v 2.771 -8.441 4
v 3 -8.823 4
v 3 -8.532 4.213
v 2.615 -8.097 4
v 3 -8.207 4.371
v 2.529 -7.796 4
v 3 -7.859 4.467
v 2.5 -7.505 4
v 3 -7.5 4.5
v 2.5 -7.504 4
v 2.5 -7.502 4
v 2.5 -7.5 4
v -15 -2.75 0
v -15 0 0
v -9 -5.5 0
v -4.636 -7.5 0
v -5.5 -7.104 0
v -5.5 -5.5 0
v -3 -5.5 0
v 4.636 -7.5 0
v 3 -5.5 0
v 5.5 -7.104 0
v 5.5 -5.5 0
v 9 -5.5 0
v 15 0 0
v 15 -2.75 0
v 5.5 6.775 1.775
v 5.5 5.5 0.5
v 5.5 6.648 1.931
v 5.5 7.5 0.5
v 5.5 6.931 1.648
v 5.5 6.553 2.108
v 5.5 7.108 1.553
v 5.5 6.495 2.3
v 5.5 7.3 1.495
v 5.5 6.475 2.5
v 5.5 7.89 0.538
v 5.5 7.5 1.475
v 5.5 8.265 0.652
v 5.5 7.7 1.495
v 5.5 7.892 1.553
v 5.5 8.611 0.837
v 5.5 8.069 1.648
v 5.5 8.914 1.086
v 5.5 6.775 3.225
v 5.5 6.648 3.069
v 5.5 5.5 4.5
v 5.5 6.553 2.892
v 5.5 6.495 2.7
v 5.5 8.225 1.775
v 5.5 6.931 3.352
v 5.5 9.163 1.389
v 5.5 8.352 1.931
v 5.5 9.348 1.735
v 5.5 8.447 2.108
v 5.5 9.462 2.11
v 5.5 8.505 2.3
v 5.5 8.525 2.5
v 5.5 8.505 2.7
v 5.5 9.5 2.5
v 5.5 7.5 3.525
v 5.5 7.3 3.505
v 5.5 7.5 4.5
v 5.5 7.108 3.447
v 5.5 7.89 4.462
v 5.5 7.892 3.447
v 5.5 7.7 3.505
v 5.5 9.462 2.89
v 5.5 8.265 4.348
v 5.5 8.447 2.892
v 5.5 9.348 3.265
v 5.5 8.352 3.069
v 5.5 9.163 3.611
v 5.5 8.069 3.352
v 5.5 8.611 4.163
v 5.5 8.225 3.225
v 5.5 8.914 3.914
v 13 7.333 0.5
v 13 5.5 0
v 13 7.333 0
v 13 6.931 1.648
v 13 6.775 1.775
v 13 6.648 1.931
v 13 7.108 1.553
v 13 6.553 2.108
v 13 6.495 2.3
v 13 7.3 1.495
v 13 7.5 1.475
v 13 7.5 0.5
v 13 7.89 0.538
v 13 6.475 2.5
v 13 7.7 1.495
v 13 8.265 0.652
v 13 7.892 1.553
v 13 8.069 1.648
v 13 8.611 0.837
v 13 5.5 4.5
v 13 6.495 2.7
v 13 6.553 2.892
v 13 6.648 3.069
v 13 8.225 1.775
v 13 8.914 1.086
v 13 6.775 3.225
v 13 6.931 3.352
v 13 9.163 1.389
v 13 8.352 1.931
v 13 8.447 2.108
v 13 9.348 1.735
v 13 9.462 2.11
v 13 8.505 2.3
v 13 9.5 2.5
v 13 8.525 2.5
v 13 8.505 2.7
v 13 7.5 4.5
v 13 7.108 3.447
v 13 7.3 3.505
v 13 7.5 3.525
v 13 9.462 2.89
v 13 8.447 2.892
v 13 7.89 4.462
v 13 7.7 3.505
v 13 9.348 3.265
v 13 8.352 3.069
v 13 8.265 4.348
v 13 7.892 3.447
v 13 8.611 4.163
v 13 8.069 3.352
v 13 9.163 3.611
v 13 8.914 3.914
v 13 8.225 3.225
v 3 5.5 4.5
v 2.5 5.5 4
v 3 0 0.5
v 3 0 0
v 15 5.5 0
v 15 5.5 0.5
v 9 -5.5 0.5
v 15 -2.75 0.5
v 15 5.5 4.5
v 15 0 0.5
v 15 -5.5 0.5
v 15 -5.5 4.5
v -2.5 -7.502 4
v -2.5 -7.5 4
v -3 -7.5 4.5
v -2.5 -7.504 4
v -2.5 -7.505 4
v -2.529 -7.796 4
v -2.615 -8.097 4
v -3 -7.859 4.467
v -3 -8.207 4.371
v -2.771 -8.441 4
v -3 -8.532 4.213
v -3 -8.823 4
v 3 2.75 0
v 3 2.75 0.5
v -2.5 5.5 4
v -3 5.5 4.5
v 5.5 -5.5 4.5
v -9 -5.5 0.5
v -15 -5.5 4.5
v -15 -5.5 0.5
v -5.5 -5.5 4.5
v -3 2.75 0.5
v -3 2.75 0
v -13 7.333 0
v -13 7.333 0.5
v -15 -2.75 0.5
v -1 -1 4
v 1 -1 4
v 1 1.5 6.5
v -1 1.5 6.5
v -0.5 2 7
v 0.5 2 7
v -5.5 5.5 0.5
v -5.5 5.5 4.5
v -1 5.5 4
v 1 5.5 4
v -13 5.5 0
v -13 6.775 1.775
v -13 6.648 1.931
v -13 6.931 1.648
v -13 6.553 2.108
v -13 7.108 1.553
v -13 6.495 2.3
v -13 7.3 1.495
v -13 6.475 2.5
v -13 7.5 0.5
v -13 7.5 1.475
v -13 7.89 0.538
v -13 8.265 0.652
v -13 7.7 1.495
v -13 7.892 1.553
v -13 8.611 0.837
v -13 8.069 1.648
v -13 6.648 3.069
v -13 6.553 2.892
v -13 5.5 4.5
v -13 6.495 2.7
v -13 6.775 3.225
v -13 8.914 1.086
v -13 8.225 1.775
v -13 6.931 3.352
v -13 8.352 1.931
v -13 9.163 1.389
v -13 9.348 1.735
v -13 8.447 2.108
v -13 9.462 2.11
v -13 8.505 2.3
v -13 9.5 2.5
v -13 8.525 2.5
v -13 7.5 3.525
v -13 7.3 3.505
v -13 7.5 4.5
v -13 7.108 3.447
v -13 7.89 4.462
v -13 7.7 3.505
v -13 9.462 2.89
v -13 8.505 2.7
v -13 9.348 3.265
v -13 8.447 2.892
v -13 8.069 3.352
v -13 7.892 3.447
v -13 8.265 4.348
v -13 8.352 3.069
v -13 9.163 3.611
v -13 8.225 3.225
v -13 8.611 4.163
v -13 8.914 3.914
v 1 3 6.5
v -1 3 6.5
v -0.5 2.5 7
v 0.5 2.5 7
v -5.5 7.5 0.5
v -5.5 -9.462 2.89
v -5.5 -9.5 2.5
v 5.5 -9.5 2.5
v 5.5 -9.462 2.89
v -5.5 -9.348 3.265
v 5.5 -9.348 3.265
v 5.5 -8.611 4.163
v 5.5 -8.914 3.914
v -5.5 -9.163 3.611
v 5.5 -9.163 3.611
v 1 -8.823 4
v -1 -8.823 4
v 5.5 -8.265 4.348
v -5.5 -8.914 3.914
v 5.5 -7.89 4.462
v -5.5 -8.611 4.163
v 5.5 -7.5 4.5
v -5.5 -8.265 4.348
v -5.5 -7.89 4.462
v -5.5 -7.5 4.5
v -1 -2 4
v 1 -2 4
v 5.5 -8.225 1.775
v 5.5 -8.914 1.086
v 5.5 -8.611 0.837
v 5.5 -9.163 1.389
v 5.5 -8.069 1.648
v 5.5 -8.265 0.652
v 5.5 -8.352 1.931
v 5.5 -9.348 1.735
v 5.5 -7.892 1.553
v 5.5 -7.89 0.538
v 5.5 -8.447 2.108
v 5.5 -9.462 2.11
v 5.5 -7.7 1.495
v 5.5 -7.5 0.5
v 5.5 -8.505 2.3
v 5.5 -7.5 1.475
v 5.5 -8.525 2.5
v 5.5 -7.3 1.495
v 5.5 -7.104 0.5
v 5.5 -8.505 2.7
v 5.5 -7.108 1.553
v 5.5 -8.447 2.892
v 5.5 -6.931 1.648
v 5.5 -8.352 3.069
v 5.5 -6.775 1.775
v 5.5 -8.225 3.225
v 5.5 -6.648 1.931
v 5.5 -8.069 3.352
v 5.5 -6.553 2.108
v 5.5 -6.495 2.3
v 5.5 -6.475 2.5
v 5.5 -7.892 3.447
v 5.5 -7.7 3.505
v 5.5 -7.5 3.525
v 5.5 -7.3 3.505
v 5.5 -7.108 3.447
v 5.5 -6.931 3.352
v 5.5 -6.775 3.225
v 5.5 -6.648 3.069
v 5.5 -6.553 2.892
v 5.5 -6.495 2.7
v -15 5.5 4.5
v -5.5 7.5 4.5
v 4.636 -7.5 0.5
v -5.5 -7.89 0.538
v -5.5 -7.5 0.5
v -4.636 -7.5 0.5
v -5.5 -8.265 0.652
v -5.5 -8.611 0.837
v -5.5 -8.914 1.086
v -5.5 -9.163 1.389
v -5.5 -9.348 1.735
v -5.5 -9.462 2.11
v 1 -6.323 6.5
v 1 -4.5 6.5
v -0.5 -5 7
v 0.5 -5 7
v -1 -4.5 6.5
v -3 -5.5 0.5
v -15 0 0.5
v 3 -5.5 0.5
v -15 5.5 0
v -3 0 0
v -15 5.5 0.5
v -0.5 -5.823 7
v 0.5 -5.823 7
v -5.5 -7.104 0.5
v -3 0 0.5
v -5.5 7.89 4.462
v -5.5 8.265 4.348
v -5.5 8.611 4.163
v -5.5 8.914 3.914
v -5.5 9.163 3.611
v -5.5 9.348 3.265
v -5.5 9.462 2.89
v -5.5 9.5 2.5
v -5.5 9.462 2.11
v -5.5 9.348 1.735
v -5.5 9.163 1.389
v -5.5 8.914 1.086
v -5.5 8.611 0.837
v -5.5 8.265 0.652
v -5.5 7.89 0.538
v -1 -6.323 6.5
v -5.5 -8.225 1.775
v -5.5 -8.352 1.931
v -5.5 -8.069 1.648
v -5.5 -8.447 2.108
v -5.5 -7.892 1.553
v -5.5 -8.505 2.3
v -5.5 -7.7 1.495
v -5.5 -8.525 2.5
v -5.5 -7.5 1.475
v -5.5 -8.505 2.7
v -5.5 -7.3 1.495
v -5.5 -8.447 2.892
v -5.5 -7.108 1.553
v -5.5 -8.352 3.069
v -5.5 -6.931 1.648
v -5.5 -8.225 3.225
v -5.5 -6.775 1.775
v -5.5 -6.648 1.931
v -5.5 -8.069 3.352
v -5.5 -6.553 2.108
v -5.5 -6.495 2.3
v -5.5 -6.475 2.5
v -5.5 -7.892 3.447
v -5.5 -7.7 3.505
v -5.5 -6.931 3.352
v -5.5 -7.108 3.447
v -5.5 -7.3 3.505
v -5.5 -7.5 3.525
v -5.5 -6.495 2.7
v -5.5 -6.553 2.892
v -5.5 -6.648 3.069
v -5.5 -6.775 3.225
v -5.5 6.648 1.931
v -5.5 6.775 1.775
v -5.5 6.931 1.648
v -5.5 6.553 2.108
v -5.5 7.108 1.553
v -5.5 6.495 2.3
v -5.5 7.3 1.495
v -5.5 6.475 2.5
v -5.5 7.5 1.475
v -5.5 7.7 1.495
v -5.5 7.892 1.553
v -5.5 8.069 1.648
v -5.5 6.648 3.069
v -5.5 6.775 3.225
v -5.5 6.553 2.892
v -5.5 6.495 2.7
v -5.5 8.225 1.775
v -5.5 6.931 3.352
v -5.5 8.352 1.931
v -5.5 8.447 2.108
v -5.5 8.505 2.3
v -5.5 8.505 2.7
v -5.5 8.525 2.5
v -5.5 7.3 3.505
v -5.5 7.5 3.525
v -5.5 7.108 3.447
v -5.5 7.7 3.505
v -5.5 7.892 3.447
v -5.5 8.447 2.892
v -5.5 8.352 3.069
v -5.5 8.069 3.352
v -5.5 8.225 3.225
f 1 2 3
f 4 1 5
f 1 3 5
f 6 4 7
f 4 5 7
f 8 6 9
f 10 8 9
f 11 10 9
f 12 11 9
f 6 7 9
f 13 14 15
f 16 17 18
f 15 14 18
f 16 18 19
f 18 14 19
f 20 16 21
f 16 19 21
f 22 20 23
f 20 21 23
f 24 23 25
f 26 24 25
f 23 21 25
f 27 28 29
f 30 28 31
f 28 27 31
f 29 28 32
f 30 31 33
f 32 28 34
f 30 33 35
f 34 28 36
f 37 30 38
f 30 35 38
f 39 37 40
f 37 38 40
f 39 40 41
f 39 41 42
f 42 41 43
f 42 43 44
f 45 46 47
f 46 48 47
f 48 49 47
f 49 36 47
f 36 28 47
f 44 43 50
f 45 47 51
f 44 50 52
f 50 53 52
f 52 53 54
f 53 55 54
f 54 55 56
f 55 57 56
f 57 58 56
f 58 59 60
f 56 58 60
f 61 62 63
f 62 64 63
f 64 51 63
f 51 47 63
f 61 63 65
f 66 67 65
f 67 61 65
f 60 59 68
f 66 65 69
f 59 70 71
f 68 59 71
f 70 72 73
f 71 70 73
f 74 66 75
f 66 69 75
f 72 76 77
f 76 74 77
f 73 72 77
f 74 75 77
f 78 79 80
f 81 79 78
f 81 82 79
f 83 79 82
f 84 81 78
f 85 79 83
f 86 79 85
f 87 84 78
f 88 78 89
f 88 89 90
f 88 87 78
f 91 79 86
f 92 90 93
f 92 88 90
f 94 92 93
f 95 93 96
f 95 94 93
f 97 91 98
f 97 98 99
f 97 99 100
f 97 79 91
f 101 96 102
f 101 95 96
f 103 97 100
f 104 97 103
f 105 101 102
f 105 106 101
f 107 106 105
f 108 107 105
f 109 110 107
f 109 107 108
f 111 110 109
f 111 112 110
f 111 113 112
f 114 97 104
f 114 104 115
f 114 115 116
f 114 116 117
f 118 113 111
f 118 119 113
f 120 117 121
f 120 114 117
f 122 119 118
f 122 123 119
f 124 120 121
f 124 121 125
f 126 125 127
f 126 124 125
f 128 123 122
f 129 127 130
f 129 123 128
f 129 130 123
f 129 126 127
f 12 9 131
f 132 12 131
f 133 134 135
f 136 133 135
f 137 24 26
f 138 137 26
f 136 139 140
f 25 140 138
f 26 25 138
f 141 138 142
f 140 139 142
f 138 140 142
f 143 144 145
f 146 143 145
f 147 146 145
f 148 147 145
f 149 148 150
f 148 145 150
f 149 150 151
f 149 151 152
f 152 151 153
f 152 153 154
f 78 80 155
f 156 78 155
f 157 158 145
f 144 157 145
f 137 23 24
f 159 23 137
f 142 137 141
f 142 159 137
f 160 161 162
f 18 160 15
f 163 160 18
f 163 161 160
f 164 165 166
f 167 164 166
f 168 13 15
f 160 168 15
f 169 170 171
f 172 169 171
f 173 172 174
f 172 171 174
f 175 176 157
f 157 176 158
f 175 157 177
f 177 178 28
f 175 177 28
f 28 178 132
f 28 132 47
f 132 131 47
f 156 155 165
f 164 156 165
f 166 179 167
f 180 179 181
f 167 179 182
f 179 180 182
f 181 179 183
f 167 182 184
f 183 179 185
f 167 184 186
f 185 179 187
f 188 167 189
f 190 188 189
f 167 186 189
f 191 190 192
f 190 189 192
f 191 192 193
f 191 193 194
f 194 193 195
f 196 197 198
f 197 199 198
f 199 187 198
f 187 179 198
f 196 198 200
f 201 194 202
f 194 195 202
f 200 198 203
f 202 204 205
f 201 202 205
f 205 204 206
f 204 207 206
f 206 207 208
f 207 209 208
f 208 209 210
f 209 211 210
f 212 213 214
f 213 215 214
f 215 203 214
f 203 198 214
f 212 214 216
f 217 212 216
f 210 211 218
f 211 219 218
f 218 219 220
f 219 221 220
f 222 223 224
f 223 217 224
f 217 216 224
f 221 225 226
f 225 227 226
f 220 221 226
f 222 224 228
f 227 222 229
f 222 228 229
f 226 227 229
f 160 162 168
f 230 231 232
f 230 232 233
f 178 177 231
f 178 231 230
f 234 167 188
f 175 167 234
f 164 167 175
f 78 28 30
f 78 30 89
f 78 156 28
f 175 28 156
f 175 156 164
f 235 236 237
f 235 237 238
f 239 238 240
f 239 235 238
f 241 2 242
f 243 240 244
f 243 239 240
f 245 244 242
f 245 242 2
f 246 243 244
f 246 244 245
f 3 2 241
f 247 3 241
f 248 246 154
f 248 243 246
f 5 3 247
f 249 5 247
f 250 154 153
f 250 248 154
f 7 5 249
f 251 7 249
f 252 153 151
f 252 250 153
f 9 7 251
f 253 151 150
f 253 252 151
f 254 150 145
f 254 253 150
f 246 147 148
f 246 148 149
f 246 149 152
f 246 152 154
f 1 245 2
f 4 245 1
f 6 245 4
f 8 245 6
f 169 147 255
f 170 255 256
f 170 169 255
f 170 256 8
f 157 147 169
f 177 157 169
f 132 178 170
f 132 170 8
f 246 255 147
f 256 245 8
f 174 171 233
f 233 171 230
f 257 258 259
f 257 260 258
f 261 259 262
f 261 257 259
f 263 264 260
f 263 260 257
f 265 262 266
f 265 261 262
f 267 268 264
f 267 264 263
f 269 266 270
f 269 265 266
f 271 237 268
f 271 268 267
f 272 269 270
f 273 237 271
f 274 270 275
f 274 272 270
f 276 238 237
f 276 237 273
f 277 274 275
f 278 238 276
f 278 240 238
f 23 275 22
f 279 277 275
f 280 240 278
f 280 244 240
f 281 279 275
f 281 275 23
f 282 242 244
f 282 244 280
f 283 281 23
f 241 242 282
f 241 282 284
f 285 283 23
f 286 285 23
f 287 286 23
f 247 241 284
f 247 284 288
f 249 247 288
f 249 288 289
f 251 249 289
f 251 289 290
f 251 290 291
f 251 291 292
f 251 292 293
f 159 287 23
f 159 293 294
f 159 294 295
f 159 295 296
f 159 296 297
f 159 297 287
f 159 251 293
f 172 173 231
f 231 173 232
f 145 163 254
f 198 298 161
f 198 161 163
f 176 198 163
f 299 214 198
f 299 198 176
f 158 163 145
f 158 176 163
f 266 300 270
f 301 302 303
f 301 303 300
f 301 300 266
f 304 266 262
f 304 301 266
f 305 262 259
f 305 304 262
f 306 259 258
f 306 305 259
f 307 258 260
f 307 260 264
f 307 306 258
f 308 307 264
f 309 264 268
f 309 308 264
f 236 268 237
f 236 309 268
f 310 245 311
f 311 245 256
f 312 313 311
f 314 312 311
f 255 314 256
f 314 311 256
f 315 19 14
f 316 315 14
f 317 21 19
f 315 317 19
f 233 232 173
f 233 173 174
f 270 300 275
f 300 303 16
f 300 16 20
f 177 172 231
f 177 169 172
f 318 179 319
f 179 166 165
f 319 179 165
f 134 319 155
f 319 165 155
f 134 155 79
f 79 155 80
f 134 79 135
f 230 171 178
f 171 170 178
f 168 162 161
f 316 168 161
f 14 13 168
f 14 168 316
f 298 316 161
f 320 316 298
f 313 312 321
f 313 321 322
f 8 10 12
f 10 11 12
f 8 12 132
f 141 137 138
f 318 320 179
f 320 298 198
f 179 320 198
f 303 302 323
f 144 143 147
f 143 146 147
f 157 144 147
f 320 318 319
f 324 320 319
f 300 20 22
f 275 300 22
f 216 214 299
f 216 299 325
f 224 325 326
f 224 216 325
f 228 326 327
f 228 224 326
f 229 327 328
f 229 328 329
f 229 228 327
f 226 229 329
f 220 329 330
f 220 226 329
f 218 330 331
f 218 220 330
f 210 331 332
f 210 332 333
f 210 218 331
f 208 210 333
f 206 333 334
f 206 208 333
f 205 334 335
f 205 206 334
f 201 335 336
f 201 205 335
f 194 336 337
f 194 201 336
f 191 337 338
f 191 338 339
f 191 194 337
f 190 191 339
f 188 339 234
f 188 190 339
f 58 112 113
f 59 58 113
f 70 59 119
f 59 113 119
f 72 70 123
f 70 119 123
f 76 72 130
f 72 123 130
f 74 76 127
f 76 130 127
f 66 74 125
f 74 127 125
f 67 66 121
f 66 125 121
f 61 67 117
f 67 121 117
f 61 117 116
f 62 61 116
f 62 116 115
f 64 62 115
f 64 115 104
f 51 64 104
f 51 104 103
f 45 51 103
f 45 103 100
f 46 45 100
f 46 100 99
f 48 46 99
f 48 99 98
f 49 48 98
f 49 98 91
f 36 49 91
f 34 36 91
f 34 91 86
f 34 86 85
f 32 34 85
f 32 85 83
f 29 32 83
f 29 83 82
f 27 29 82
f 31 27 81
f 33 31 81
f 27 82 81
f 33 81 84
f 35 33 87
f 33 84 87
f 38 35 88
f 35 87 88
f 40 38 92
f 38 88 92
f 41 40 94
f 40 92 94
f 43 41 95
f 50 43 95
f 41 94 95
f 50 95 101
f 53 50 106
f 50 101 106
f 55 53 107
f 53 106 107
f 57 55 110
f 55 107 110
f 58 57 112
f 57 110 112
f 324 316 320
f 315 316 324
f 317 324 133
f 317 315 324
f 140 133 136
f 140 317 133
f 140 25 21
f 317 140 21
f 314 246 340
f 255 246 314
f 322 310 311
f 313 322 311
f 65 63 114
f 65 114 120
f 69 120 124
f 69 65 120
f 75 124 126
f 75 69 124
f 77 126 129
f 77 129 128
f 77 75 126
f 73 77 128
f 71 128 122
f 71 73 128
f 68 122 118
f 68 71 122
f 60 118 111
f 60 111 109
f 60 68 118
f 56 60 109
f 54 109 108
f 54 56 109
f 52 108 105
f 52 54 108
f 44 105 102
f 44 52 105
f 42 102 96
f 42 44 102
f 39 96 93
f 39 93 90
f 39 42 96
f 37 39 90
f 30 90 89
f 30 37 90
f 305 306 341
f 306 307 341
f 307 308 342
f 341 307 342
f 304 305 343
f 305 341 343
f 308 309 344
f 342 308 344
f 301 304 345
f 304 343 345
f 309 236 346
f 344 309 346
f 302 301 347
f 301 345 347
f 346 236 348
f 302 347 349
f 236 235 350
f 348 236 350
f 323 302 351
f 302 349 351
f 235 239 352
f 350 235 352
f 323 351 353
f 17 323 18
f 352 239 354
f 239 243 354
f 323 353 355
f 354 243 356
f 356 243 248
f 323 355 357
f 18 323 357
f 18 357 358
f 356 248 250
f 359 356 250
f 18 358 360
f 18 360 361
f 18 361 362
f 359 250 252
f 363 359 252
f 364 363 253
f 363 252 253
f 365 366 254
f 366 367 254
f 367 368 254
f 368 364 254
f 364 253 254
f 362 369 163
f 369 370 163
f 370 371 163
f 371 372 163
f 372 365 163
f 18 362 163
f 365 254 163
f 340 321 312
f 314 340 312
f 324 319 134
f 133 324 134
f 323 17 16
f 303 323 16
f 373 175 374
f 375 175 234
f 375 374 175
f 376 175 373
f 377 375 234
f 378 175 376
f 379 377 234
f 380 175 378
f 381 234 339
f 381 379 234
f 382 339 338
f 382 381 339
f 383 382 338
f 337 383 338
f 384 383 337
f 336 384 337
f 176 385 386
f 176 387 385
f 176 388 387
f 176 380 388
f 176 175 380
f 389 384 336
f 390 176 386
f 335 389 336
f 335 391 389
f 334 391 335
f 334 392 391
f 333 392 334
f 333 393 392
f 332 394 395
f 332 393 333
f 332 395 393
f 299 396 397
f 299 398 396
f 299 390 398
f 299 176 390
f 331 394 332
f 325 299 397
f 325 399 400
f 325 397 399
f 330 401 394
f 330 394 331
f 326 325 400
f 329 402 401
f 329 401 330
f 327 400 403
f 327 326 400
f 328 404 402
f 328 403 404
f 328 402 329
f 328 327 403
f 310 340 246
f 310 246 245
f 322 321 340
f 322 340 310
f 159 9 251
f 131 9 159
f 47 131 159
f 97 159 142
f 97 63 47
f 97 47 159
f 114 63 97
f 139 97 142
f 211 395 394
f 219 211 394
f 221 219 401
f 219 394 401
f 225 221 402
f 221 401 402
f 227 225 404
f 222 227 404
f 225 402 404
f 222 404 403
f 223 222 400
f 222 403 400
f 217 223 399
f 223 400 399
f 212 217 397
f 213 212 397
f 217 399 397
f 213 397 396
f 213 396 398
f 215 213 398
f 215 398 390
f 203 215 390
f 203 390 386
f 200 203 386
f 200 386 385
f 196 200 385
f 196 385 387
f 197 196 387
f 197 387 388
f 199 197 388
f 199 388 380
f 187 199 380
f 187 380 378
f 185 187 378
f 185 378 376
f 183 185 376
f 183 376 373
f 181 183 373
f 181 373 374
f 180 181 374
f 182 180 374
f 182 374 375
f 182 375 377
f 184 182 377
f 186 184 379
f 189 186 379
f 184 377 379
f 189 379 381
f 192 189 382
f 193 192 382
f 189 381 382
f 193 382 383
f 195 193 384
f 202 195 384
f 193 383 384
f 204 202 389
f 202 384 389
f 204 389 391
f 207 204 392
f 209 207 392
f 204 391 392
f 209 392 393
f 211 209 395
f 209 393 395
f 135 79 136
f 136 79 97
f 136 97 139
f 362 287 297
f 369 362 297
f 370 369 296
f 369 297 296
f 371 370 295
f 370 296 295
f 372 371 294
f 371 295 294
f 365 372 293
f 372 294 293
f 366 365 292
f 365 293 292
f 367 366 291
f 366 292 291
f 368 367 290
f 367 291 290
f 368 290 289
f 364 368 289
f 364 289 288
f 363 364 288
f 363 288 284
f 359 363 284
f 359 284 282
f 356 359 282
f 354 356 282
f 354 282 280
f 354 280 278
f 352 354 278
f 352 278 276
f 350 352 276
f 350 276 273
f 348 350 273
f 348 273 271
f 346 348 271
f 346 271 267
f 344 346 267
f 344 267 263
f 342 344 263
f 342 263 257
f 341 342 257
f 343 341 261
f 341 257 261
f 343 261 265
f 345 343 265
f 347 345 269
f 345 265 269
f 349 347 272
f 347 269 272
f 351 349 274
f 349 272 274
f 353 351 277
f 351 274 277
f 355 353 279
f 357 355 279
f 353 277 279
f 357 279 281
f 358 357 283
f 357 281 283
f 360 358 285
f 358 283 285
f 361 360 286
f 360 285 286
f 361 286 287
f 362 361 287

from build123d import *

# Parameters (mm, degrees)
F0_W      = 30
F0_H      = 15
F1_DEPTH  = 4.5
F3_DEPTH  = 30
F4_W      = 9.5
F4_H      = 2
F4_W_2    = 2
F4_W_3    = 11
F5_DEPTH  = 25
F6_R      = 1.025
F7_DEPTH  = 30
F8_W      = 9.5
F8_H      = 2
F9_DEPTH  = 25
F10_W     = 11
F10_H     = 2
F11_DEPTH = 25
F12_W     = 2
F12_H     = 2
F13_DEPTH = 25
F15_DEPTH = 0.5
F16_W     = 5
F16_H     = 13
F16_H_2   = 3.8236103207
F17_DEPTH = 0.5
F18_W     = 2
F18_H     = 14.3228756555
F19_DEPTH = 3
F20_SIZE  = 2.99999
F21_SIZE  = 3
F22_SIZE  = 0.5
F23_SIZE  = 0.49999
F25_DEPTH = 3


# Not quite as in the source:
# - a fillet or chamfer is up to 0.001 mm smaller than in the source, because OpenCascade refuses the exact size
# - a feature names something its author has since deleted; it is built from what else it names


with BuildPart() as f1:
    # F0 (on Top) → F1 (new body)
    with BuildSketch(Plane.XY):
        Rectangle(F0_W, F0_H)
    extrude(amount=F1_DEPTH)

    # F2 (on face) → F3 (join)
    with BuildSketch(Plane(origin=(-15, 0, 0), x_dir=(0, -1, 0), z_dir=(-1, 0, 0))):
        with BuildLine():
            ThreePointArc((-7.5, 0.5), (-6.0857864376, 1.0857864376), (-5.5, 2.5))
            ThreePointArc((-5.5, 2.5), (-6.0857864376, 3.9142135624), (-7.5, 4.5))
            Line((-7.5, 4.5), (-7.5, 0.5))
        make_face()
        with BuildLine():
            Line((-7.5, 0.5), (-7.5, 4.5))
            ThreePointArc((-7.5, 4.5), (-9.5, 2.5), (-7.5, 0.5))
        make_face()
        with BuildLine():
            ThreePointArc((9.5, 2.5), (8.9142135624, 3.9142135624), (7.5, 4.5))
            Line((7.5, 4.5), (7.5, 0.5))
            ThreePointArc((7.5, 0.5), (8.9142135624, 1.0857864376), (9.5, 2.5))
        make_face()
    extrude(amount=-F3_DEPTH)

    # F4 (on face) → F5 (cut)
    with BuildSketch(Plane.XY.offset(4.5)):
        with Locations((-10.25, -8.5)):
            Rectangle(F4_W, F4_H)
        with Locations((10.25, -8.5)):
            Rectangle(F4_W, F4_H)
        with Locations((-14, 8.5)):
            Rectangle(F4_W_2, F4_H)
        with Locations((14, 8.5)):
            Rectangle(F4_W_2, F4_H)
        with Locations((0, 8.5)):
            Rectangle(F4_W_3, F4_H)
    extrude(amount=-F5_DEPTH, mode=Mode.SUBTRACT)

    # F6 (on face) → F7 (cut)
    with BuildSketch(Plane.YZ.offset(15)):
        with Locations((-7.5, 2.5)):
            Circle(F6_R)
        with Locations((7.5, 2.5)):
            Circle(F6_R)
    extrude(amount=-F7_DEPTH, mode=Mode.SUBTRACT)

    # F8 (on face) → F9 (cut)
    with BuildSketch(Plane.XY.offset(4.5)):
        with Locations((-10.25, -6.5)):
            Rectangle(F8_W, F8_H)
        with Locations((10.25, -6.5)):
            Rectangle(F8_W, F8_H)
    extrude(amount=-F9_DEPTH, mode=Mode.SUBTRACT)

    # F10 (on face) → F11 (cut)
    with BuildSketch(Plane.XY.offset(4.5)):
        with Locations((0, 6.5)):
            Rectangle(F10_W, F10_H)
    extrude(amount=-F11_DEPTH, mode=Mode.SUBTRACT)

    # F12 (on face) → F13 (cut)
    with BuildSketch(Plane.XY.offset(4.5)):
        with Locations((-14, 6.5)):
            Rectangle(F12_W, F12_H)
        with Locations((14, 6.5)):
            Rectangle(F12_W, F12_H)
    extrude(amount=-F13_DEPTH, mode=Mode.SUBTRACT)

    # F14 (on face) → F15 (cut)
    with BuildSketch(Plane(origin=(0, 0, 0), x_dir=(1, 0, 0), z_dir=(0, 0, -1))):
        Polygon((3, 5.5), (0, 5.5), (-3, 5.5), (-15, 0), (-15, -5.5), (-3, 0), (3, 0), (15, -5.5), (15, 0), align=None)
        Polygon((-15, 5.5), (-15, 2.75), (-9, 5.5), align=None)
        Polygon((9, 5.5), (15, 2.75), (15, 5.5), align=None)
        Polygon((-3, -2.75), (-13, -7.3333333333), (-13, -7.5), (-5.5, -7.5), (-5.5, -5.5), (5.5, -5.5), (5.5, -7.5), (13, -7.5), (13, -7.3333333333), (3, -2.75), align=None)
        Polygon((-5.5, 7.5), (-5.5, 7.1041666667), (-4.6363636364, 7.5), align=None)
        Polygon((4.6363636364, 7.5), (5.5, 7.1041666667), (5.5, 7.5), align=None)
    extrude(amount=-F15_DEPTH, mode=Mode.SUBTRACT)

    # F16 (on face) → F17 (cut)
    with BuildSketch(Plane.XY.offset(4.5)):
        with Locations((0, -1)):
            Rectangle(F16_W, F16_H)
        with Locations((0, -9.4118051603)):
            Rectangle(F16_W, F16_H_2)
    extrude(amount=-F17_DEPTH, mode=Mode.SUBTRACT)

    # F18 (on face) → F19 (join)
    with BuildSketch(Plane.XY.offset(4)):
        with Locations((0, -1.6614378278)):
            Rectangle(F18_W, F18_H)
    extrude(amount=F19_DEPTH)

    # F20 (size 3 in the source; OpenCascade refuses exactly that, so slightly less here)
    f20_edges = [f1.edges().sort_by_distance(p)[0] for p in [
        (0, -8.822876, 7),
    ]]
    chamfer(f20_edges, length=F20_SIZE)

    # F21
    f21_edges = [f1.edges().sort_by_distance(p)[0] for p in [
        (0, 5.5, 7),
    ]]
    chamfer(f21_edges, length=F21_SIZE)

    # F22
    f22_edges = [f1.edges().sort_by_distance(p)[0] for p in [
        (-1, -1.661443, 7),
        (1, -1.661443, 7),
    ]]
    chamfer(f22_edges, length=F22_SIZE)

    # F23 (size 0.5 in the source; OpenCascade refuses exactly that, so slightly less here)
    f23_edges = [f1.edges().sort_by_distance(p)[0] for p in [
        (2.5, -1, 4.5),
        (-2.5, -1, 4.5),
    ]]
    chamfer(f23_edges, length=F23_SIZE)

    # F24 (on face) → F25 (cut)
    with BuildSketch(Plane.YZ.offset(1)):
        Polygon((-5, 7), (-4.5, 6.5), (1.5, 6.5), (2, 7), align=None)
        Polygon((-4.5, 6.5), (-2, 4), (-1.5, 4), (-1, 4), (1.5, 6.5), align=None)
    extrude(amount=-F25_DEPTH, mode=Mode.SUBTRACT)


solid = f1.part
